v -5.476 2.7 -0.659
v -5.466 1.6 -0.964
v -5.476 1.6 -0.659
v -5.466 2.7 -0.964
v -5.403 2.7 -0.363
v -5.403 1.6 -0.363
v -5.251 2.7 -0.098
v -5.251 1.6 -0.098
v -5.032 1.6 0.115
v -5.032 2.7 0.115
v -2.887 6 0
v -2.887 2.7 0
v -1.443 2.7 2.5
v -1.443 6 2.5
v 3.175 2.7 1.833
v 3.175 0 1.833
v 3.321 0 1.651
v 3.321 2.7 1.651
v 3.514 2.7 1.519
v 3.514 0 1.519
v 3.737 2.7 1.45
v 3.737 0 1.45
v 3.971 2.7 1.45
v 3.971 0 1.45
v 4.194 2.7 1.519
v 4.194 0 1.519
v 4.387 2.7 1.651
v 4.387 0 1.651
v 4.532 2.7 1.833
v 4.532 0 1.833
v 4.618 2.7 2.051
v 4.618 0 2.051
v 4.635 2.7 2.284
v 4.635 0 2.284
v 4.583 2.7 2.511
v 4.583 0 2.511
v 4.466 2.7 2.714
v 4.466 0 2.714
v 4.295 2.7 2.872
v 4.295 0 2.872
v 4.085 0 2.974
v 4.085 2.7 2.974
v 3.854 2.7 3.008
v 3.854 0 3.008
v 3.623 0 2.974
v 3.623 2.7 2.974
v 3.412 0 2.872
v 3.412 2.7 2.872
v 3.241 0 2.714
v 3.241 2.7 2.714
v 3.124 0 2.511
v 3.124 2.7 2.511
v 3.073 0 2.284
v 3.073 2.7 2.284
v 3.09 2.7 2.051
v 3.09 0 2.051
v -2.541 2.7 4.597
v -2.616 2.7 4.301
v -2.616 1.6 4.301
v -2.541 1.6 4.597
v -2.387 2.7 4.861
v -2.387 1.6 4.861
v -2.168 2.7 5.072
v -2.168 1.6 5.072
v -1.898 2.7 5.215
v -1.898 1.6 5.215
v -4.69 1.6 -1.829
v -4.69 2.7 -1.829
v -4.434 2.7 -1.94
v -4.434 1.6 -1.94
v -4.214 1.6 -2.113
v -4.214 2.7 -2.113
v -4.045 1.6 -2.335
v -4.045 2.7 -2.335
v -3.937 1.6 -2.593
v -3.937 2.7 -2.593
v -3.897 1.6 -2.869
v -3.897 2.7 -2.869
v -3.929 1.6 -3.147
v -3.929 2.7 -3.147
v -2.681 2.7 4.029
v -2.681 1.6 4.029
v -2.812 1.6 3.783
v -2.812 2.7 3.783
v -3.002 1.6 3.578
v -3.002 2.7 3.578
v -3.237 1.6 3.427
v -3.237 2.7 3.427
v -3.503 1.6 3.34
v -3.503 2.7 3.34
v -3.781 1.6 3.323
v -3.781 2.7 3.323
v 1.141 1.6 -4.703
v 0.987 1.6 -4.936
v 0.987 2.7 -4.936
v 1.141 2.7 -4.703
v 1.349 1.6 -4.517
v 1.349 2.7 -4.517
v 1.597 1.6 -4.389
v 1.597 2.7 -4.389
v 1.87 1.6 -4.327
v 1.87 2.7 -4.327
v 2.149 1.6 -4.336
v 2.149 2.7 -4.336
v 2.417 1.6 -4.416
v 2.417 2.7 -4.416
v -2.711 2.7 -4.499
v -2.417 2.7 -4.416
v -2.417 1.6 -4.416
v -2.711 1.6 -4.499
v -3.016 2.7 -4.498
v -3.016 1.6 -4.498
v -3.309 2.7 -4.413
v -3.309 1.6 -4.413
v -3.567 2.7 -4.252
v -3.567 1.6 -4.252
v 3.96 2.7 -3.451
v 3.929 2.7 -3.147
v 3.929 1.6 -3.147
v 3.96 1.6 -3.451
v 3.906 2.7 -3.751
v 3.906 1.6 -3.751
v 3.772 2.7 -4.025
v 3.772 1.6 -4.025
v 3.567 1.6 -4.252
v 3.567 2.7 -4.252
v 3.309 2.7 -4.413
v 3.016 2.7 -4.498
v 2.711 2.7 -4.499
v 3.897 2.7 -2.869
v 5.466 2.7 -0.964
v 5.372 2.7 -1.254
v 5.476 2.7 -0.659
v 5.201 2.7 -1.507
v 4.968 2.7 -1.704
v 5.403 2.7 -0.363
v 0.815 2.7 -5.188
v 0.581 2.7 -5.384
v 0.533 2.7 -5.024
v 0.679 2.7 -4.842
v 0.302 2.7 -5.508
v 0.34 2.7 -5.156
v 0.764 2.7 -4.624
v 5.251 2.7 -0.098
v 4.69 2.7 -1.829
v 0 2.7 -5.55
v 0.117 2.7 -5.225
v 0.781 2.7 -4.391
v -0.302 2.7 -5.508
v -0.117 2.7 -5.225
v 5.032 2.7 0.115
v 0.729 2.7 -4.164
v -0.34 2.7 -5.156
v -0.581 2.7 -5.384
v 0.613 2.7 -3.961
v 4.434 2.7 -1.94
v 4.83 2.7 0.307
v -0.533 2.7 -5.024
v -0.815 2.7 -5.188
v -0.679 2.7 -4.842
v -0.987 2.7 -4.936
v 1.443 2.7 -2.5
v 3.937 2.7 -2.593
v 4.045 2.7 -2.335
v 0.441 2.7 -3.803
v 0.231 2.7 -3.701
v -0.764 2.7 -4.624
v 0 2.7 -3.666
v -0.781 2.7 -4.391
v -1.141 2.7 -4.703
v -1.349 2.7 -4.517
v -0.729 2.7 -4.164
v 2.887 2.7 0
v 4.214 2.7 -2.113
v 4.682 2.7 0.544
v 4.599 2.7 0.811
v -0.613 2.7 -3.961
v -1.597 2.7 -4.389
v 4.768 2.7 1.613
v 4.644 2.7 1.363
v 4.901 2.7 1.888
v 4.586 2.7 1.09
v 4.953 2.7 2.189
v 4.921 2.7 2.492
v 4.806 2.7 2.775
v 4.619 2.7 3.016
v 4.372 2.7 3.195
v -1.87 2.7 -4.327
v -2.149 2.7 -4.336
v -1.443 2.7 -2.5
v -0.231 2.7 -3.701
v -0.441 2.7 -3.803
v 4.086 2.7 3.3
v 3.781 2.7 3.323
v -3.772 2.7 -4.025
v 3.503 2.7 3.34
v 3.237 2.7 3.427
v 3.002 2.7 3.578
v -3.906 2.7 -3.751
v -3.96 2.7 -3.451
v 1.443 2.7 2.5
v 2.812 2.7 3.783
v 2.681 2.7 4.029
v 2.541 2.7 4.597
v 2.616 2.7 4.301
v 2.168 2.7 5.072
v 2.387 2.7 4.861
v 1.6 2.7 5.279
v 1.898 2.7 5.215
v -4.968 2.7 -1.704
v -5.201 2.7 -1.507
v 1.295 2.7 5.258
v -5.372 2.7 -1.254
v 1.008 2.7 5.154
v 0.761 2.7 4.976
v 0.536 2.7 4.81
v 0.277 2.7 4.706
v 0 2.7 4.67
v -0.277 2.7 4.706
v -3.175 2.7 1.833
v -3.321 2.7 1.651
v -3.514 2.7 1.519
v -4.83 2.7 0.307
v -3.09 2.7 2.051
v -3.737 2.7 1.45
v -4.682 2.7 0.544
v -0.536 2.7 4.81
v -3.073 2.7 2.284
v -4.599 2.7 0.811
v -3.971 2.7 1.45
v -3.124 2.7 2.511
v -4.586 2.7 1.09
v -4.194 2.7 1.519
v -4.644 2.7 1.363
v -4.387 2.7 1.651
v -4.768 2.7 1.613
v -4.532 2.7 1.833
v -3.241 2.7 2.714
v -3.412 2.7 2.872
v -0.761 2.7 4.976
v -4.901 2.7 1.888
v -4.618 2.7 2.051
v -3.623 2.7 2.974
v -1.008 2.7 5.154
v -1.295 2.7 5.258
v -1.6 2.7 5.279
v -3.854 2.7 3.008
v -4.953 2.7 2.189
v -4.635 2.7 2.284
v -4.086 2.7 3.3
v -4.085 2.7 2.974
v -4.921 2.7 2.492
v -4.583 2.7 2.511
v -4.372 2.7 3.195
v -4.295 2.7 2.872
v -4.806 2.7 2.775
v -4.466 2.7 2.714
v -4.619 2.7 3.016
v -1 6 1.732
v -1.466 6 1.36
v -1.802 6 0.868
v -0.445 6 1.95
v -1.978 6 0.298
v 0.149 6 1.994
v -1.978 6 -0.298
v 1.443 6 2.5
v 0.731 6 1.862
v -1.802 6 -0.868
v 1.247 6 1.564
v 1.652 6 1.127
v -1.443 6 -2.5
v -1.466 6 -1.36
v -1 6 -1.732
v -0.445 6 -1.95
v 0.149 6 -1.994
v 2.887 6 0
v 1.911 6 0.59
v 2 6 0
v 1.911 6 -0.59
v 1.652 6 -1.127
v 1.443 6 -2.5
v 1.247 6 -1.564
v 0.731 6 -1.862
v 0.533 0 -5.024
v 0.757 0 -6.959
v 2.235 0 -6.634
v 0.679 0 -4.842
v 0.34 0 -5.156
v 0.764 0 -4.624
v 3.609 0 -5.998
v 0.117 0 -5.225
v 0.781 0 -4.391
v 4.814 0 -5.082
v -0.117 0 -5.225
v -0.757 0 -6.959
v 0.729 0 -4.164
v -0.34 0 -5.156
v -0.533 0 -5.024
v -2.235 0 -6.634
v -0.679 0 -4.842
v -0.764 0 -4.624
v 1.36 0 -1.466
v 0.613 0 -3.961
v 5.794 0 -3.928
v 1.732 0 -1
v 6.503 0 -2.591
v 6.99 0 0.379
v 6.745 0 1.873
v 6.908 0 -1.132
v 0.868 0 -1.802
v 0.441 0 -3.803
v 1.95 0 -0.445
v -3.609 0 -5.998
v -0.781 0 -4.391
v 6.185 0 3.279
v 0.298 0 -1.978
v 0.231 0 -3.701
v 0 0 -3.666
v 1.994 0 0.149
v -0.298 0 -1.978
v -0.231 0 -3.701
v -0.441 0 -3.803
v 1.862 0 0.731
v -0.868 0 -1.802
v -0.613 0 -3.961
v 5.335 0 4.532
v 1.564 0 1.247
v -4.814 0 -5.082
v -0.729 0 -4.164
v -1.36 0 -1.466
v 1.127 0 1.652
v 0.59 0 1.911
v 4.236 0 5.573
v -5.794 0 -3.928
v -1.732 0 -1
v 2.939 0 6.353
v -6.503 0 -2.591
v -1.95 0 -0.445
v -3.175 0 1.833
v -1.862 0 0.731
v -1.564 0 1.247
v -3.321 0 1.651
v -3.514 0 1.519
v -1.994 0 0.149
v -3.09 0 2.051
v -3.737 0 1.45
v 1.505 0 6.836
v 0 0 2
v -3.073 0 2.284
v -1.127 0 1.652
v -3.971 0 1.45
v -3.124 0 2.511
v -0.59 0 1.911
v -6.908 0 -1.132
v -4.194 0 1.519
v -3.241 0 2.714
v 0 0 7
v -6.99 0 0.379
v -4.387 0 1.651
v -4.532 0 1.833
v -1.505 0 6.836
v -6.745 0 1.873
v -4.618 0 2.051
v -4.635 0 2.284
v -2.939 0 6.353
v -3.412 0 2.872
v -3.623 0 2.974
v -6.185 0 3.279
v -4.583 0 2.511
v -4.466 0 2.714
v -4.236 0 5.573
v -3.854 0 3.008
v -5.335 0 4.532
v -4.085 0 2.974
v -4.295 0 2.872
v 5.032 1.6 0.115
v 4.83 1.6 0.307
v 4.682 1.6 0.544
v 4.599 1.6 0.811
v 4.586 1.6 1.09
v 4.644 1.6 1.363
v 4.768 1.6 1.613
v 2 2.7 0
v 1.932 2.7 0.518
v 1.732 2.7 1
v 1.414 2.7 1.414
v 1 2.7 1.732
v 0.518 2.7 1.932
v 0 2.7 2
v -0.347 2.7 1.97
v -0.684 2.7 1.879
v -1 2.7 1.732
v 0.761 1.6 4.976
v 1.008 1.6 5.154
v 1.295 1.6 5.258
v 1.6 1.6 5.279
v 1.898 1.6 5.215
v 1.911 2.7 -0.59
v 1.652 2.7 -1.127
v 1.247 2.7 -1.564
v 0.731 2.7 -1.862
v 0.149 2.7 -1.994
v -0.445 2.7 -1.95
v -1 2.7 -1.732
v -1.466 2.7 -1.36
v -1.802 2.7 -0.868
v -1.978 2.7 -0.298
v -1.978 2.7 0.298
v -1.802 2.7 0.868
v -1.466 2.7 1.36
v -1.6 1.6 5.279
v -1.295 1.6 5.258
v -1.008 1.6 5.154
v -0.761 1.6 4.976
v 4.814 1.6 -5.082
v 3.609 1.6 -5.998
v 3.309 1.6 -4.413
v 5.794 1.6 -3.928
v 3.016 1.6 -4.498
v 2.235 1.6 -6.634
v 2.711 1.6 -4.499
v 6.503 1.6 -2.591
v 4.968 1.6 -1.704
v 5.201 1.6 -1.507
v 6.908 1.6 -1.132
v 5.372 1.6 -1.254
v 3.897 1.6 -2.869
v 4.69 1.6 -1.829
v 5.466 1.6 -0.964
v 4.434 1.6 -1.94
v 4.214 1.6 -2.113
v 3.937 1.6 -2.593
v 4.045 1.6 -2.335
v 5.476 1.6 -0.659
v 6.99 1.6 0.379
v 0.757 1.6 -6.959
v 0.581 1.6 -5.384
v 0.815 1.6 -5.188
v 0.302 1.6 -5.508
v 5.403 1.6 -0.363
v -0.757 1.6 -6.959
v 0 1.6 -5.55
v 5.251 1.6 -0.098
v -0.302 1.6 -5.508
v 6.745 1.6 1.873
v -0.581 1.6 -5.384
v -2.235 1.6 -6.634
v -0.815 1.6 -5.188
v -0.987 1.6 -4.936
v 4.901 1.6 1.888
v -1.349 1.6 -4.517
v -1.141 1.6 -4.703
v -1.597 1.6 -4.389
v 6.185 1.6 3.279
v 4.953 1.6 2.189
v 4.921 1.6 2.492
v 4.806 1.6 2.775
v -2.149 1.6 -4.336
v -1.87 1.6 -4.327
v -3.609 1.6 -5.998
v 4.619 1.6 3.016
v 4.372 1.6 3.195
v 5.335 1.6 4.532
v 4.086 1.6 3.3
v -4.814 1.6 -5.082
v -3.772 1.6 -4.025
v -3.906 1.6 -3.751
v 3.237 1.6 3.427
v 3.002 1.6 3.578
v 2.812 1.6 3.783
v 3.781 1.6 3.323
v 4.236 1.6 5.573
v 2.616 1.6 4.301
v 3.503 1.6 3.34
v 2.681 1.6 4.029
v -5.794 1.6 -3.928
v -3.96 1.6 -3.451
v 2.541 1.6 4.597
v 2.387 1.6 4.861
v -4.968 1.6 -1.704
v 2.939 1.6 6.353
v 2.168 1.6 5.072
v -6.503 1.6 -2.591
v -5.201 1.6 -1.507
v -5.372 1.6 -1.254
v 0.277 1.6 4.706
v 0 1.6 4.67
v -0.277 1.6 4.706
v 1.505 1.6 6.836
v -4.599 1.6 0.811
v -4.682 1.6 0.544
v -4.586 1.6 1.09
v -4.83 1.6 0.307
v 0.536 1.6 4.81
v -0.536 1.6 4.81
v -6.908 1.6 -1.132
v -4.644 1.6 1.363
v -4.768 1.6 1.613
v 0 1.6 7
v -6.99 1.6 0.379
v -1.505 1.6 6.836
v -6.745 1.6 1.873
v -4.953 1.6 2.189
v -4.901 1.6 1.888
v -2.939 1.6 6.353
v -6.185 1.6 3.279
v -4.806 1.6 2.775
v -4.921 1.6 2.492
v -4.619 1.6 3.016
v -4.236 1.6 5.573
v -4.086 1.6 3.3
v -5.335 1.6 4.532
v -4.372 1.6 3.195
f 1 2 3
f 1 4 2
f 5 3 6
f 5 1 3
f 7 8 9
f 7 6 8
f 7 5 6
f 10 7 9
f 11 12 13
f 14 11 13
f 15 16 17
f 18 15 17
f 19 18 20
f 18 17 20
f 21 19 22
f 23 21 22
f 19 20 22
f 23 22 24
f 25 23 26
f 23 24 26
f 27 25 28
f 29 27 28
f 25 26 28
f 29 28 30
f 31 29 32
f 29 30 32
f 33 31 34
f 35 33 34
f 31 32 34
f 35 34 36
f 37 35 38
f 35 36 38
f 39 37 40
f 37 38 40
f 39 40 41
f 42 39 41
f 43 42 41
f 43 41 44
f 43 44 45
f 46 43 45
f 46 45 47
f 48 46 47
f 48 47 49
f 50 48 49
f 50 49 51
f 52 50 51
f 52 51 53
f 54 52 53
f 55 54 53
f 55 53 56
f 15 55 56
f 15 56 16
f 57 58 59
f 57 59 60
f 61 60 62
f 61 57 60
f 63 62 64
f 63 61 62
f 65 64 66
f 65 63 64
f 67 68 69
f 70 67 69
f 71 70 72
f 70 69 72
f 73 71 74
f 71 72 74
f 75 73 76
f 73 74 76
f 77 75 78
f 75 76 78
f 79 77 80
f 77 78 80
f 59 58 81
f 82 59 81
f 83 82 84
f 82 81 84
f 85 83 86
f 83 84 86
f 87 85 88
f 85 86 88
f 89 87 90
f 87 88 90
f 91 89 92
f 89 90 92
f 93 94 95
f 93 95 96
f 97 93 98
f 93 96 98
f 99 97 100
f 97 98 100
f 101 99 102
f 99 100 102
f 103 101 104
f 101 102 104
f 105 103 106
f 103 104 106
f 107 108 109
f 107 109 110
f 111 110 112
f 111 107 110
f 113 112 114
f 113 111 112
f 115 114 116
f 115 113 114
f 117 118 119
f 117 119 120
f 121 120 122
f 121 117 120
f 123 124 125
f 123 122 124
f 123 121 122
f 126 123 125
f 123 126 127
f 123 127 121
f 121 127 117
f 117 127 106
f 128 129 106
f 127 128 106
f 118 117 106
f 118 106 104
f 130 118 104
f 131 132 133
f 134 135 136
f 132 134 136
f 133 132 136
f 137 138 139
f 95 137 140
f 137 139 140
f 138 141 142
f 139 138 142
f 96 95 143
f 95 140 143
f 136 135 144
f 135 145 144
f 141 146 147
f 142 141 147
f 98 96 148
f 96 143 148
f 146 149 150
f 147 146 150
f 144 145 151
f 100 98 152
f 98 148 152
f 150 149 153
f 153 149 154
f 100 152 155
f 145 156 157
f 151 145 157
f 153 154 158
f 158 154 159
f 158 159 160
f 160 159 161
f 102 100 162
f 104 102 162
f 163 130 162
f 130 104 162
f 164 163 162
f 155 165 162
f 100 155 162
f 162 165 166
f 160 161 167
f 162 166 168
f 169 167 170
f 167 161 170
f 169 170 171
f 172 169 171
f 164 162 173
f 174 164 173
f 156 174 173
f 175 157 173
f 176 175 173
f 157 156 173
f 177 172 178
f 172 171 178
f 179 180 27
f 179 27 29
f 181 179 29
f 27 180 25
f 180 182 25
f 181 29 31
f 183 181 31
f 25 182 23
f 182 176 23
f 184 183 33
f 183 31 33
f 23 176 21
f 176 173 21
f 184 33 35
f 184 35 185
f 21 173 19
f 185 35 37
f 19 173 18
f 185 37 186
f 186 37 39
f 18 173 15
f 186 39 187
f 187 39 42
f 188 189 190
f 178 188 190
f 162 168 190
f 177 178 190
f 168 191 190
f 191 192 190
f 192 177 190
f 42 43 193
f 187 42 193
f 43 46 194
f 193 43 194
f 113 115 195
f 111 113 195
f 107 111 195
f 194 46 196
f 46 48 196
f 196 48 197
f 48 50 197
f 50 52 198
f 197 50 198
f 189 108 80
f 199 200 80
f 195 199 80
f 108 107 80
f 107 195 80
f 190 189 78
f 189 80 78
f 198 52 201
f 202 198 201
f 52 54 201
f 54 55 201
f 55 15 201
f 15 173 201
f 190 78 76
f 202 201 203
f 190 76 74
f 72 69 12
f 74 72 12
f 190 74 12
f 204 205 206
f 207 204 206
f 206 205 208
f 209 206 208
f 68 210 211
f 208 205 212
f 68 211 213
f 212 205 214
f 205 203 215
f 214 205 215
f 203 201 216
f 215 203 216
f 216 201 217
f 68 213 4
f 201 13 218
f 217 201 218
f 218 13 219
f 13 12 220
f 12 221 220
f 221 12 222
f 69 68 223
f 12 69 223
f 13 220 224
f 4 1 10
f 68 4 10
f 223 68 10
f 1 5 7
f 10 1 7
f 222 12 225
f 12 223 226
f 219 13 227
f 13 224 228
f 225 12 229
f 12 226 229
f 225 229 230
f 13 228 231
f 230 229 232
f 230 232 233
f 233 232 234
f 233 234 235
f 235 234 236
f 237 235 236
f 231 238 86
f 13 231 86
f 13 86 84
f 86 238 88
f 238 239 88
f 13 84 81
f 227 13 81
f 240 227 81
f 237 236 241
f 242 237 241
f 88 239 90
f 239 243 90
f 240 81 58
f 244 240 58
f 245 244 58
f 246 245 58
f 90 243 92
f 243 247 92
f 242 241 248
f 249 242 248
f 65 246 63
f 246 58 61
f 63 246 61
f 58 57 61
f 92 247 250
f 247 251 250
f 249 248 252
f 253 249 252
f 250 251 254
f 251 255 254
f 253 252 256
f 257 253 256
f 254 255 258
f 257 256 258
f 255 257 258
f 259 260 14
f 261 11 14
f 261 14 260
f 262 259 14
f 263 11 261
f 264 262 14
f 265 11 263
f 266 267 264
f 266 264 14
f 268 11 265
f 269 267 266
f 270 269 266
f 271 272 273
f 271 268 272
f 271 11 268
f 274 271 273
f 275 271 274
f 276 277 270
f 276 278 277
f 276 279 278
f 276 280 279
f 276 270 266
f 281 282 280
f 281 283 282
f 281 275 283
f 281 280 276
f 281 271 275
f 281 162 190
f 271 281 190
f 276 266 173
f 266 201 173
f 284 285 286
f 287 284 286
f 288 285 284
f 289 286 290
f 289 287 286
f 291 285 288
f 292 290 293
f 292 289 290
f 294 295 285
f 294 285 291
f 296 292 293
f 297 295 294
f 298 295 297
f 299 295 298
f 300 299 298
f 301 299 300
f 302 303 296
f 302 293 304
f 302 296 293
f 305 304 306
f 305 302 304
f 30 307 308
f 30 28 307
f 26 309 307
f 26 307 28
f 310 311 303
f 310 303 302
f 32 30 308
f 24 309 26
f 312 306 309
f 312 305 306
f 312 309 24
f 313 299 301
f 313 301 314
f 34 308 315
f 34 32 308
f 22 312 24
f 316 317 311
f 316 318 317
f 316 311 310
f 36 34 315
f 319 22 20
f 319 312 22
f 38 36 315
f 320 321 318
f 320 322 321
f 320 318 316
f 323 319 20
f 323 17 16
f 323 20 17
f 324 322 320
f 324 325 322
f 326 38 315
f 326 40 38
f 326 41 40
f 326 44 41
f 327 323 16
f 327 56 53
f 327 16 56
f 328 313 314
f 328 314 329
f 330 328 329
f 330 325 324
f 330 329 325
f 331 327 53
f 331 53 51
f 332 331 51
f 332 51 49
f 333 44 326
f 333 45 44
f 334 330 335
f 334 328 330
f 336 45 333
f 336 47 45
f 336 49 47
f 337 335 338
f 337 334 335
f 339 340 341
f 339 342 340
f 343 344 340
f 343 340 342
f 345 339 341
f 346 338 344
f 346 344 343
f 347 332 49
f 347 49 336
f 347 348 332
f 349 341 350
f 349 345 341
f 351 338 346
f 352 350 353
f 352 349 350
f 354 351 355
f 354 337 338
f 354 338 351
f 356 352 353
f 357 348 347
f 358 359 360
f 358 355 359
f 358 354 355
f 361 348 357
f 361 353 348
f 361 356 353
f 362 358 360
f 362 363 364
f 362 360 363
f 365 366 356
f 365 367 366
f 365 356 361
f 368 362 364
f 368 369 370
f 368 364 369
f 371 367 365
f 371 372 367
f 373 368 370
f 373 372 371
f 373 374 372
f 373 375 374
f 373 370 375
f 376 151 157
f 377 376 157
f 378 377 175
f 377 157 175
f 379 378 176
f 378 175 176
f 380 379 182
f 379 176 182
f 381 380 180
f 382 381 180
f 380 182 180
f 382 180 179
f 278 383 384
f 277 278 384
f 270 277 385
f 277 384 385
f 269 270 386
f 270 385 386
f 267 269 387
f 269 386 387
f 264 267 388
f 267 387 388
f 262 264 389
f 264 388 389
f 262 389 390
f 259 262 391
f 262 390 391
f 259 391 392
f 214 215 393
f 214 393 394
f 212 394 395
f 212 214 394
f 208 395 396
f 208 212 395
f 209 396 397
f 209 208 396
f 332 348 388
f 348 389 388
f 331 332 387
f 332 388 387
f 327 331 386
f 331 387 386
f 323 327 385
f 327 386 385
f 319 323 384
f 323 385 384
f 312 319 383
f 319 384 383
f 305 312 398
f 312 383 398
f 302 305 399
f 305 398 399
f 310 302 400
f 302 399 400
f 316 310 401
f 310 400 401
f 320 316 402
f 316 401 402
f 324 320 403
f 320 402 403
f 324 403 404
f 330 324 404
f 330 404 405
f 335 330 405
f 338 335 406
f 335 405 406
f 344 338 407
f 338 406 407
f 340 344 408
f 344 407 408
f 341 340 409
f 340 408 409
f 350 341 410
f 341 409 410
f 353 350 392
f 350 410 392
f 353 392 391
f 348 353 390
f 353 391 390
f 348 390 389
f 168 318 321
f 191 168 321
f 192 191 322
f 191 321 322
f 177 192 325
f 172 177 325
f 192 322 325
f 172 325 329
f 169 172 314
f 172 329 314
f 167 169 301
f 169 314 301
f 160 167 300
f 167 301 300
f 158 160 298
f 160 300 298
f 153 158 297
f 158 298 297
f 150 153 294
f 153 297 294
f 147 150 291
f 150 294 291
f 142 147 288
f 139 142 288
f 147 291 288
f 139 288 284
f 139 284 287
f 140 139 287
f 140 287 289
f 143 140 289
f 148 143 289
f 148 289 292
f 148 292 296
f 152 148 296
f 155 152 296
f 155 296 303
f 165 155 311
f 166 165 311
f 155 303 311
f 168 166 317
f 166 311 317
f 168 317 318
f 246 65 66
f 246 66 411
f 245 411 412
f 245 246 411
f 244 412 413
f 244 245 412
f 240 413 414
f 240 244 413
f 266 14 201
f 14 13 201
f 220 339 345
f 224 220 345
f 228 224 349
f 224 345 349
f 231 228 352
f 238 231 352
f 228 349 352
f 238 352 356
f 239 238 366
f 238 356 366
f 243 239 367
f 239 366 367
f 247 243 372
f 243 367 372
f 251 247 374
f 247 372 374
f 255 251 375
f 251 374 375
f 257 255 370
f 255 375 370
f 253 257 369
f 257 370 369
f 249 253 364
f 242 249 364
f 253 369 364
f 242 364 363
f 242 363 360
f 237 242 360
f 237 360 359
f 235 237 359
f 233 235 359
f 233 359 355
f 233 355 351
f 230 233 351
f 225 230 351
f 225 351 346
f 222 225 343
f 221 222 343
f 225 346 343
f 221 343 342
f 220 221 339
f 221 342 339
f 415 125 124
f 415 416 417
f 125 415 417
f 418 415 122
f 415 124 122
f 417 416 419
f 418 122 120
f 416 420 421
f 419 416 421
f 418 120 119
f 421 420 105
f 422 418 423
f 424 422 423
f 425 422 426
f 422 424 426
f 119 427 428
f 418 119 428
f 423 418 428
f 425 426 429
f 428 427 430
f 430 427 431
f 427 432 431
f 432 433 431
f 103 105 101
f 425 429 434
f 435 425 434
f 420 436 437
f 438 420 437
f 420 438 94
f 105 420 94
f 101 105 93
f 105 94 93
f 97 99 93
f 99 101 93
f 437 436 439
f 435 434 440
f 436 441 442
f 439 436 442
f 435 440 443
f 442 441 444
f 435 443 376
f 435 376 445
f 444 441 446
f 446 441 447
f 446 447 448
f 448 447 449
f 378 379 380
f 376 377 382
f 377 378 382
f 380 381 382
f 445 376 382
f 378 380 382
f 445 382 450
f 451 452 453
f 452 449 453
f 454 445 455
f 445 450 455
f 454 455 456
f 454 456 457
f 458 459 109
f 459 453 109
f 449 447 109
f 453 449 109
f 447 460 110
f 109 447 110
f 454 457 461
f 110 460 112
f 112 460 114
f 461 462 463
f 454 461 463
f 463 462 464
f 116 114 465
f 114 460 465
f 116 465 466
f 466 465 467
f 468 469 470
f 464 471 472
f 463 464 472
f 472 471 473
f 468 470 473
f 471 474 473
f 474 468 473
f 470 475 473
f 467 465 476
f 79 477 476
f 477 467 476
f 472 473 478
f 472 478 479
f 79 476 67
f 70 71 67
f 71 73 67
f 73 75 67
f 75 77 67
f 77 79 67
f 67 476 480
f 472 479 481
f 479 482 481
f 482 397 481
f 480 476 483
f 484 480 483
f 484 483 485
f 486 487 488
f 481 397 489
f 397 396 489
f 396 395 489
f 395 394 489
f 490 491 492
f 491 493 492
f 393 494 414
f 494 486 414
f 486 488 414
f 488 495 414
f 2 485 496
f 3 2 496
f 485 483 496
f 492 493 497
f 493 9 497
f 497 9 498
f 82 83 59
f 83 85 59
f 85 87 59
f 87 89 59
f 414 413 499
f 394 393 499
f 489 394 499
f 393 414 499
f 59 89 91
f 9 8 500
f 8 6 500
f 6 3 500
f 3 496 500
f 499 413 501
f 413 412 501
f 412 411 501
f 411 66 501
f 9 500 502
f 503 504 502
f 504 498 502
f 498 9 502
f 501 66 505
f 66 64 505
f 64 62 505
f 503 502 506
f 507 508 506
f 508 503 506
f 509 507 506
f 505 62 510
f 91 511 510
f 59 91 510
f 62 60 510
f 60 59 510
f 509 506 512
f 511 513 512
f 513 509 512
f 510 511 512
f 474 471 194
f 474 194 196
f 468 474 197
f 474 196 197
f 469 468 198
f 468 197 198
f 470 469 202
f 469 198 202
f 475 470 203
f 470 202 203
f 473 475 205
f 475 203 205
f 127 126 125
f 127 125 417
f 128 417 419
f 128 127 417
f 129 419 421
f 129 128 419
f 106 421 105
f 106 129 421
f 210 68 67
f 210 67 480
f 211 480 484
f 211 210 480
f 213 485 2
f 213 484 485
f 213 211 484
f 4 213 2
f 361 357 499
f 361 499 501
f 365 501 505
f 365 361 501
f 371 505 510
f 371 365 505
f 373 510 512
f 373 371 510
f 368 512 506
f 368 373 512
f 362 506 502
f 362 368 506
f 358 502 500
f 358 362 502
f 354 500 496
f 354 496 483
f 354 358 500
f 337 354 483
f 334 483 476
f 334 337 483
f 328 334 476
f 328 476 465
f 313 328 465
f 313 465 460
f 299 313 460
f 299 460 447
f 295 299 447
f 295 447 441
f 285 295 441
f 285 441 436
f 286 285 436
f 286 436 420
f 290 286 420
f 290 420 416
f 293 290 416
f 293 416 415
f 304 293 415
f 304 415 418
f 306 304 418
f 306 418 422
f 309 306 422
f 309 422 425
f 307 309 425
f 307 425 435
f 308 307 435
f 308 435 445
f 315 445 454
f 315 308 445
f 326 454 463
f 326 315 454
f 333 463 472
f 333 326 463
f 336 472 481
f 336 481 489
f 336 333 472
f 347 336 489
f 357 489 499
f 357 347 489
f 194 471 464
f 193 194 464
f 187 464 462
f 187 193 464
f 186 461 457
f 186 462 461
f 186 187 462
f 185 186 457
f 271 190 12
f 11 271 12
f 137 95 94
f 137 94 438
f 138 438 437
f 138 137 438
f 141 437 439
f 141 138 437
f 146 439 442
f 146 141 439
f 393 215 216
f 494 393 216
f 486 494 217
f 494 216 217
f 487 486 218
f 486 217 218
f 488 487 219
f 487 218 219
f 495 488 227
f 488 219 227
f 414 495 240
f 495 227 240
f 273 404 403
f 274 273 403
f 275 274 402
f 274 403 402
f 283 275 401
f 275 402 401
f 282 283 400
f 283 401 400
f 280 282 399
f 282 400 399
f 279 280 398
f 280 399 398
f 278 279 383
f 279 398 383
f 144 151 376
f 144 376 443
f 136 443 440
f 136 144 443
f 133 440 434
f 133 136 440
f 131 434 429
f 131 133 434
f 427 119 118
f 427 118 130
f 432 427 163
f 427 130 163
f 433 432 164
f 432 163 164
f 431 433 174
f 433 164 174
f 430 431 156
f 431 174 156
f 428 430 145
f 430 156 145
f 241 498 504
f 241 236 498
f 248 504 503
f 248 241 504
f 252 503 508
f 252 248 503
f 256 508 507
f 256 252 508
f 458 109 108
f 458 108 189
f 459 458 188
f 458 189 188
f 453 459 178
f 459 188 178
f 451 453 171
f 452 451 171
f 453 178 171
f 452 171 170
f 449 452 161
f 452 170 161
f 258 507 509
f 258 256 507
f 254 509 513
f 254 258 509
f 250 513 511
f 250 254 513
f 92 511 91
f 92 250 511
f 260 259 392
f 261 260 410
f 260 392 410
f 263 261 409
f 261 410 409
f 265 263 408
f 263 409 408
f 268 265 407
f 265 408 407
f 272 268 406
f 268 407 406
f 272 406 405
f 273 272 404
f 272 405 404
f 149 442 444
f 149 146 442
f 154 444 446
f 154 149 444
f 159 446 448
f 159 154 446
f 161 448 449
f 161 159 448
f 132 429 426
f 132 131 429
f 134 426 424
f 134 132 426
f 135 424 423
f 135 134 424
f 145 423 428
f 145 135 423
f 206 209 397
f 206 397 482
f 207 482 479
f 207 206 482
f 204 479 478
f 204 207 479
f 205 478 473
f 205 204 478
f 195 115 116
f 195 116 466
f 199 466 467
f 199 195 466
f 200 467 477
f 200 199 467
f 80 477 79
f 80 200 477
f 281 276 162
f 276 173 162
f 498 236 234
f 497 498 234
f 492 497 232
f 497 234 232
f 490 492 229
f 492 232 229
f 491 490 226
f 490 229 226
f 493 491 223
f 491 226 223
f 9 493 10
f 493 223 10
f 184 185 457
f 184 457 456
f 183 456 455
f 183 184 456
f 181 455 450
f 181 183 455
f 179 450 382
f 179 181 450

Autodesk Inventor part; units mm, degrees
ref_plane "YZ Plane" through (0, 0, 0) normal (1, 0, 0) x (0, 1, 0)
ref_plane "XZ Plane" through (0, 0, 0) normal (0, 1, 0) x (-1, 0, 0)
ref_plane "XY Plane" through (0, 0, 0) normal (0, 0, 1) x (1, 0, 0)
sketch "Skizze3" plane through (0, 0, 0) normal (1, 0, 0) x (0, 1, 0)
  line L0 (9.15, 0) -> (0, 0)
  line L1 (1.6, 5.55) -> (2.7, 5.55)
  line L2 (2.7, 5.55) -> (2.7, 2)
  line L3 (2.7, 2) -> (0, 2)
  line L4 (0, 2) -> (0, 7)
  line L5 (0, 7) -> (1.6, 7)
  line L6 (1.6, 7) -> (1.6, 5.55)
  dimension "d17" = 4
  dimension "d18" = 11.1
  dimension "d24" = 14
  dimension "d69" = 1.6
  dimension "d75" = 1.1
sketch "Skizze3 outline for Umdrehung1" plane through (0, 0, 0) normal (1, 0, 0) x (0, 1, 0)
  line L0 (1.6, 7) -> (0, 7)
  line L1 (1.6, 5.55) -> (1.6, 7)
  line L2 (2.7, 5.55) -> (1.6, 5.55)
  line L3 (2.7, 2) -> (2.7, 5.55)
  line L4 (0, 2) -> (2.7, 2)
  line L5 (0, 7) -> (0, 2)
revolve "Umdrehung1" add sketch "Skizze3 outline for Umdrehung1" angle 360 about axis through (0, 9.15, 0) along (0, -1, 0)
sketch "Skizze8" plane through (0, 2.7, 0) normal (0, 1, 0) x (1, 0, 0)
  circle A0 centre (0, 0) radius 5.55
  arc A1 (0.760995, -4.975916) -> (1.898212, -5.215294) centre (1.52199, -4.181632) ccw
  arc A2 (0.760995, -4.975916) -> (-0.760995, -4.975916) centre (0, -5.7702) ccw
  arc A3 (-1.898212, -5.215294) -> (-0.760995, -4.975916) centre (-1.52199, -4.181632) ccw
  line L0 (0, 9.8) -> (0, -9.8) construction
  line L1 (-1.898212, -5.215294) -> (0, 0) construction
  dimension "d59" = 1.1
  dimension "d60" = 1.1
  dimension "d61" = 20
sketch "Skizze8 outline for Extrusion5" plane through (0, 2.7, 0) normal (0, 1, 0) x (1, 0, 0)
  arc A0 (0.760995, -4.975916) -> (-0.760995, -4.975916) centre (0, -5.7702) ccw
  arc A1 (1.898212, -5.215294) -> (0.760995, -4.975916) centre (1.52199, -4.181632) cw
  arc A2 (-1.898212, -5.215294) -> (1.898212, -5.215294) centre (0, 0) ccw
  arc A3 (-0.760995, -4.975916) -> (-1.898212, -5.215294) centre (-1.52199, -4.181632) cw
extrude "Extrusion5" cut sketch "Skizze8 outline for Extrusion5" against normal up to surface (1.1 mm away)
pattern_circular "Runde Anordnung2" count 9 over 360 about axis through (0, -10, 0) along (0, 1, 0) of "Extrusion5"
sketch "Skizze9" plane through (0, 2.7, 5.7702) normal (0, 1, 0) x (1, 0, 0)
  circle A0 centre (0, 5.7702) radius 3 construction
  line L0 (0, 15.5702) -> (0, -4.0298) construction
  circle A1 centre (0, 5.7702) radius 2
  line L1 (-1.443376, 3.2702) -> (-2.886751, 5.7702)
  line L2 (-2.886751, 5.7702) -> (-1.443376, 8.2702)
  line L3 (-1.443376, 8.2702) -> (1.443376, 8.2702)
  line L4 (1.443376, 8.2702) -> (2.886751, 5.7702)
  line L5 (2.886751, 5.7702) -> (1.443376, 3.2702)
  line L6 (1.443376, 3.2702) -> (-1.443376, 3.2702)
  circle A2 centre (0, 10.2202) radius 1 construction
  arc A3 (0.986762, 10.706307) -> (-0.986762, 10.706307) centre (0, 10.2202) ccw construction
  line L7 (1.443376, 3.2702) -> (0, 5.7702)
  line L8 (0, 5.7702) -> (-1.443376, 3.2702)
  line L9 (1, 4.038149) -> (1, 3.2702)
  line L10 (-1, 4.038149) -> (-1, 3.2702)
  line L11 (1.443376, 3.2702) -> (1.443376, 4.385763)
  line L12 (-1.443376, 3.2702) -> (-1.443376, 4.385763)
  point P0 (0, 7.7702)
  point P1 (0, 11.2202)
  point P2 (1, 4.038149)
  point P3 (-1, 4.038149)
  dimension "d92" = 2
  dimension "d70" = 6
  dimension "d74" = 4
  dimension "d89" = 0.5
  dimension "d90" = 5
  dimension "d91" = 4.45
sketch "Skizze9 outline for Extrusion6" plane through (0, 2.7, 5.7702) normal (0, 1, 0) x (1, 0, 0)
  circle A0 centre (0, 5.7702) radius 2
  line L0 (1.443376, 3.2702) -> (2.886751, 5.7702)
  line L1 (2.886751, 5.7702) -> (1.443376, 8.2702)
  line L2 (1.443376, 8.2702) -> (-1.443376, 8.2702)
  line L3 (-1.443376, 8.2702) -> (-2.886751, 5.7702)
  line L4 (-2.886751, 5.7702) -> (-1.443376, 3.2702)
  line L5 (-1.443376, 3.2702) -> (1.443376, 3.2702)
extrude "Extrusion6" add sketch "Skizze9 outline for Extrusion6" along normal blind 3.3
hole "Bohrung3" at (0, 2.7, -4.45) direction (0, -1, 0) diameter 1.567 end through all thread size "M2x0.4" class "6H" standard "ISO Metric profile"
pattern_circular "Runde Anordnung3" count 3 over 360 about axis through (0, -10, 0) along (0, 1, 0) of "Bohrung3", "Extrusion6"
properties part number "Encoder Klemmscheibe" material "Aluminium 6061"
